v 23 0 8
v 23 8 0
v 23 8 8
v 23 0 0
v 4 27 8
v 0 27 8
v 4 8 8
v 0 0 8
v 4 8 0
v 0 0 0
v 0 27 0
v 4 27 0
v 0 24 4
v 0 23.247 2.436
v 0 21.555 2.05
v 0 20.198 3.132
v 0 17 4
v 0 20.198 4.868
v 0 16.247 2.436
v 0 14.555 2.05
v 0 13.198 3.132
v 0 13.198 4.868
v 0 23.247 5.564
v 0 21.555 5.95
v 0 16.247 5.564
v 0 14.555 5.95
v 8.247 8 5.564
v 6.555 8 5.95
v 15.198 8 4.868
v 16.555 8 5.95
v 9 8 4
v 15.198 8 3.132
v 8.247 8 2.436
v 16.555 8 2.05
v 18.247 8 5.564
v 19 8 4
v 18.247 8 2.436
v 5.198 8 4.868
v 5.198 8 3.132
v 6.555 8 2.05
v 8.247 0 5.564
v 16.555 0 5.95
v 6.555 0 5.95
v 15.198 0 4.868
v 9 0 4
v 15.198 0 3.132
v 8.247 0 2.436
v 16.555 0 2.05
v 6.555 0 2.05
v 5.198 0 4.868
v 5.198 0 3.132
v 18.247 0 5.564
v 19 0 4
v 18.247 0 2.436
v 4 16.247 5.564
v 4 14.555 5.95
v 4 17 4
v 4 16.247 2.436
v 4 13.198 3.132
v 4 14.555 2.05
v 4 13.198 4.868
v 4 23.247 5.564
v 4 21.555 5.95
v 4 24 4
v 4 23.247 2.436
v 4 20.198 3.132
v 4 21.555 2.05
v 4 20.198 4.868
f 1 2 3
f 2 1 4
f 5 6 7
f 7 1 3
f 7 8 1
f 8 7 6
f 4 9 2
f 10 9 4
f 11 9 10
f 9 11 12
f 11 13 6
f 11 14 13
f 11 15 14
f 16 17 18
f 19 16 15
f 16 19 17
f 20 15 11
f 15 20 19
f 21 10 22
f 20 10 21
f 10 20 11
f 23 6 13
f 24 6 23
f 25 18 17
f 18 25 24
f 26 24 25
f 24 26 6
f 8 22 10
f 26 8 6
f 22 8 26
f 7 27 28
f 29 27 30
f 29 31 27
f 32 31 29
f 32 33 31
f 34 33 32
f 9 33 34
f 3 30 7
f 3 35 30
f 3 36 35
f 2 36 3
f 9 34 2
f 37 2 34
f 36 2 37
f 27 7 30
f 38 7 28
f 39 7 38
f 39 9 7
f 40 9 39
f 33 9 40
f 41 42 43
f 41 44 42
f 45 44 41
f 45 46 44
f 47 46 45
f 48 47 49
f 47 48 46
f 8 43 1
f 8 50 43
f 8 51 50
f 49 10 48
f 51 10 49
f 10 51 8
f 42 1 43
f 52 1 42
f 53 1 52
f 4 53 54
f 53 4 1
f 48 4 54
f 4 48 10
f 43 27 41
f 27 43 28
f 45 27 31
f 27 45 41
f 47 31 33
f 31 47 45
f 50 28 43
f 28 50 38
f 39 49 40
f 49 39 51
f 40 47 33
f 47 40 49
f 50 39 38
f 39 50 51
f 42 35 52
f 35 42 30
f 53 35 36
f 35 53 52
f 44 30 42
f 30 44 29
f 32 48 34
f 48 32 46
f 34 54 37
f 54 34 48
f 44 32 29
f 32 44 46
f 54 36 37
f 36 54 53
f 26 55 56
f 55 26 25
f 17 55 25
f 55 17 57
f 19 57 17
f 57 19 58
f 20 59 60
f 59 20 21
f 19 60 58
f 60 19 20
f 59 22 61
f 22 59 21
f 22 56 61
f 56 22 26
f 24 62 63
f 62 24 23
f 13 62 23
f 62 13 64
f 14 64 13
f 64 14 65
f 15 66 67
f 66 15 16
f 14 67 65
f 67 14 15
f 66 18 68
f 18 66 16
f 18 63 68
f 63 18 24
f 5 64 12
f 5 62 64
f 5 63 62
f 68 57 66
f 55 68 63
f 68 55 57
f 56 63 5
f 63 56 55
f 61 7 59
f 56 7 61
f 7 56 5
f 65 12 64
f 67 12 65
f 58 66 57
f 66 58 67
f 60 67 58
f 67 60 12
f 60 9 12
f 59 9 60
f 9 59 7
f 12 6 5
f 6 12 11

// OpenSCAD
holeDiameter = 4;
thickness = 4;
centerToCenter = 10;
heightToFirstHoleCenter = 7;
bracketHeight = heightToFirstHoleCenter + holeDiameter/2 + centerToCenter + holeDiameter;

difference() {
	cube ([bracketHeight,thickness*2,8,]);
	# rotate(a=[90,0,0])
		translate([heightToFirstHoleCenter, 4, -thickness])
			cylinder(r=holeDiameter/2,h=thickness*3,center=true);

	# rotate(a=[90,0,0])
		translate([heightToFirstHoleCenter+centerToCenter, 4, -thickness])
			cylinder(r=holeDiameter/2,h=thickness*3,center=true);
}

difference() {
	#cube ([thickness,23+thickness,8]);

	for (i = [11, 18]) {
		# translate([thickness/2,i + thickness,thickness])
			rotate(a=[90,0,90])
				#cylinder(r=holeDiameter/2,h=thickness*2,center=true);
	}

}
